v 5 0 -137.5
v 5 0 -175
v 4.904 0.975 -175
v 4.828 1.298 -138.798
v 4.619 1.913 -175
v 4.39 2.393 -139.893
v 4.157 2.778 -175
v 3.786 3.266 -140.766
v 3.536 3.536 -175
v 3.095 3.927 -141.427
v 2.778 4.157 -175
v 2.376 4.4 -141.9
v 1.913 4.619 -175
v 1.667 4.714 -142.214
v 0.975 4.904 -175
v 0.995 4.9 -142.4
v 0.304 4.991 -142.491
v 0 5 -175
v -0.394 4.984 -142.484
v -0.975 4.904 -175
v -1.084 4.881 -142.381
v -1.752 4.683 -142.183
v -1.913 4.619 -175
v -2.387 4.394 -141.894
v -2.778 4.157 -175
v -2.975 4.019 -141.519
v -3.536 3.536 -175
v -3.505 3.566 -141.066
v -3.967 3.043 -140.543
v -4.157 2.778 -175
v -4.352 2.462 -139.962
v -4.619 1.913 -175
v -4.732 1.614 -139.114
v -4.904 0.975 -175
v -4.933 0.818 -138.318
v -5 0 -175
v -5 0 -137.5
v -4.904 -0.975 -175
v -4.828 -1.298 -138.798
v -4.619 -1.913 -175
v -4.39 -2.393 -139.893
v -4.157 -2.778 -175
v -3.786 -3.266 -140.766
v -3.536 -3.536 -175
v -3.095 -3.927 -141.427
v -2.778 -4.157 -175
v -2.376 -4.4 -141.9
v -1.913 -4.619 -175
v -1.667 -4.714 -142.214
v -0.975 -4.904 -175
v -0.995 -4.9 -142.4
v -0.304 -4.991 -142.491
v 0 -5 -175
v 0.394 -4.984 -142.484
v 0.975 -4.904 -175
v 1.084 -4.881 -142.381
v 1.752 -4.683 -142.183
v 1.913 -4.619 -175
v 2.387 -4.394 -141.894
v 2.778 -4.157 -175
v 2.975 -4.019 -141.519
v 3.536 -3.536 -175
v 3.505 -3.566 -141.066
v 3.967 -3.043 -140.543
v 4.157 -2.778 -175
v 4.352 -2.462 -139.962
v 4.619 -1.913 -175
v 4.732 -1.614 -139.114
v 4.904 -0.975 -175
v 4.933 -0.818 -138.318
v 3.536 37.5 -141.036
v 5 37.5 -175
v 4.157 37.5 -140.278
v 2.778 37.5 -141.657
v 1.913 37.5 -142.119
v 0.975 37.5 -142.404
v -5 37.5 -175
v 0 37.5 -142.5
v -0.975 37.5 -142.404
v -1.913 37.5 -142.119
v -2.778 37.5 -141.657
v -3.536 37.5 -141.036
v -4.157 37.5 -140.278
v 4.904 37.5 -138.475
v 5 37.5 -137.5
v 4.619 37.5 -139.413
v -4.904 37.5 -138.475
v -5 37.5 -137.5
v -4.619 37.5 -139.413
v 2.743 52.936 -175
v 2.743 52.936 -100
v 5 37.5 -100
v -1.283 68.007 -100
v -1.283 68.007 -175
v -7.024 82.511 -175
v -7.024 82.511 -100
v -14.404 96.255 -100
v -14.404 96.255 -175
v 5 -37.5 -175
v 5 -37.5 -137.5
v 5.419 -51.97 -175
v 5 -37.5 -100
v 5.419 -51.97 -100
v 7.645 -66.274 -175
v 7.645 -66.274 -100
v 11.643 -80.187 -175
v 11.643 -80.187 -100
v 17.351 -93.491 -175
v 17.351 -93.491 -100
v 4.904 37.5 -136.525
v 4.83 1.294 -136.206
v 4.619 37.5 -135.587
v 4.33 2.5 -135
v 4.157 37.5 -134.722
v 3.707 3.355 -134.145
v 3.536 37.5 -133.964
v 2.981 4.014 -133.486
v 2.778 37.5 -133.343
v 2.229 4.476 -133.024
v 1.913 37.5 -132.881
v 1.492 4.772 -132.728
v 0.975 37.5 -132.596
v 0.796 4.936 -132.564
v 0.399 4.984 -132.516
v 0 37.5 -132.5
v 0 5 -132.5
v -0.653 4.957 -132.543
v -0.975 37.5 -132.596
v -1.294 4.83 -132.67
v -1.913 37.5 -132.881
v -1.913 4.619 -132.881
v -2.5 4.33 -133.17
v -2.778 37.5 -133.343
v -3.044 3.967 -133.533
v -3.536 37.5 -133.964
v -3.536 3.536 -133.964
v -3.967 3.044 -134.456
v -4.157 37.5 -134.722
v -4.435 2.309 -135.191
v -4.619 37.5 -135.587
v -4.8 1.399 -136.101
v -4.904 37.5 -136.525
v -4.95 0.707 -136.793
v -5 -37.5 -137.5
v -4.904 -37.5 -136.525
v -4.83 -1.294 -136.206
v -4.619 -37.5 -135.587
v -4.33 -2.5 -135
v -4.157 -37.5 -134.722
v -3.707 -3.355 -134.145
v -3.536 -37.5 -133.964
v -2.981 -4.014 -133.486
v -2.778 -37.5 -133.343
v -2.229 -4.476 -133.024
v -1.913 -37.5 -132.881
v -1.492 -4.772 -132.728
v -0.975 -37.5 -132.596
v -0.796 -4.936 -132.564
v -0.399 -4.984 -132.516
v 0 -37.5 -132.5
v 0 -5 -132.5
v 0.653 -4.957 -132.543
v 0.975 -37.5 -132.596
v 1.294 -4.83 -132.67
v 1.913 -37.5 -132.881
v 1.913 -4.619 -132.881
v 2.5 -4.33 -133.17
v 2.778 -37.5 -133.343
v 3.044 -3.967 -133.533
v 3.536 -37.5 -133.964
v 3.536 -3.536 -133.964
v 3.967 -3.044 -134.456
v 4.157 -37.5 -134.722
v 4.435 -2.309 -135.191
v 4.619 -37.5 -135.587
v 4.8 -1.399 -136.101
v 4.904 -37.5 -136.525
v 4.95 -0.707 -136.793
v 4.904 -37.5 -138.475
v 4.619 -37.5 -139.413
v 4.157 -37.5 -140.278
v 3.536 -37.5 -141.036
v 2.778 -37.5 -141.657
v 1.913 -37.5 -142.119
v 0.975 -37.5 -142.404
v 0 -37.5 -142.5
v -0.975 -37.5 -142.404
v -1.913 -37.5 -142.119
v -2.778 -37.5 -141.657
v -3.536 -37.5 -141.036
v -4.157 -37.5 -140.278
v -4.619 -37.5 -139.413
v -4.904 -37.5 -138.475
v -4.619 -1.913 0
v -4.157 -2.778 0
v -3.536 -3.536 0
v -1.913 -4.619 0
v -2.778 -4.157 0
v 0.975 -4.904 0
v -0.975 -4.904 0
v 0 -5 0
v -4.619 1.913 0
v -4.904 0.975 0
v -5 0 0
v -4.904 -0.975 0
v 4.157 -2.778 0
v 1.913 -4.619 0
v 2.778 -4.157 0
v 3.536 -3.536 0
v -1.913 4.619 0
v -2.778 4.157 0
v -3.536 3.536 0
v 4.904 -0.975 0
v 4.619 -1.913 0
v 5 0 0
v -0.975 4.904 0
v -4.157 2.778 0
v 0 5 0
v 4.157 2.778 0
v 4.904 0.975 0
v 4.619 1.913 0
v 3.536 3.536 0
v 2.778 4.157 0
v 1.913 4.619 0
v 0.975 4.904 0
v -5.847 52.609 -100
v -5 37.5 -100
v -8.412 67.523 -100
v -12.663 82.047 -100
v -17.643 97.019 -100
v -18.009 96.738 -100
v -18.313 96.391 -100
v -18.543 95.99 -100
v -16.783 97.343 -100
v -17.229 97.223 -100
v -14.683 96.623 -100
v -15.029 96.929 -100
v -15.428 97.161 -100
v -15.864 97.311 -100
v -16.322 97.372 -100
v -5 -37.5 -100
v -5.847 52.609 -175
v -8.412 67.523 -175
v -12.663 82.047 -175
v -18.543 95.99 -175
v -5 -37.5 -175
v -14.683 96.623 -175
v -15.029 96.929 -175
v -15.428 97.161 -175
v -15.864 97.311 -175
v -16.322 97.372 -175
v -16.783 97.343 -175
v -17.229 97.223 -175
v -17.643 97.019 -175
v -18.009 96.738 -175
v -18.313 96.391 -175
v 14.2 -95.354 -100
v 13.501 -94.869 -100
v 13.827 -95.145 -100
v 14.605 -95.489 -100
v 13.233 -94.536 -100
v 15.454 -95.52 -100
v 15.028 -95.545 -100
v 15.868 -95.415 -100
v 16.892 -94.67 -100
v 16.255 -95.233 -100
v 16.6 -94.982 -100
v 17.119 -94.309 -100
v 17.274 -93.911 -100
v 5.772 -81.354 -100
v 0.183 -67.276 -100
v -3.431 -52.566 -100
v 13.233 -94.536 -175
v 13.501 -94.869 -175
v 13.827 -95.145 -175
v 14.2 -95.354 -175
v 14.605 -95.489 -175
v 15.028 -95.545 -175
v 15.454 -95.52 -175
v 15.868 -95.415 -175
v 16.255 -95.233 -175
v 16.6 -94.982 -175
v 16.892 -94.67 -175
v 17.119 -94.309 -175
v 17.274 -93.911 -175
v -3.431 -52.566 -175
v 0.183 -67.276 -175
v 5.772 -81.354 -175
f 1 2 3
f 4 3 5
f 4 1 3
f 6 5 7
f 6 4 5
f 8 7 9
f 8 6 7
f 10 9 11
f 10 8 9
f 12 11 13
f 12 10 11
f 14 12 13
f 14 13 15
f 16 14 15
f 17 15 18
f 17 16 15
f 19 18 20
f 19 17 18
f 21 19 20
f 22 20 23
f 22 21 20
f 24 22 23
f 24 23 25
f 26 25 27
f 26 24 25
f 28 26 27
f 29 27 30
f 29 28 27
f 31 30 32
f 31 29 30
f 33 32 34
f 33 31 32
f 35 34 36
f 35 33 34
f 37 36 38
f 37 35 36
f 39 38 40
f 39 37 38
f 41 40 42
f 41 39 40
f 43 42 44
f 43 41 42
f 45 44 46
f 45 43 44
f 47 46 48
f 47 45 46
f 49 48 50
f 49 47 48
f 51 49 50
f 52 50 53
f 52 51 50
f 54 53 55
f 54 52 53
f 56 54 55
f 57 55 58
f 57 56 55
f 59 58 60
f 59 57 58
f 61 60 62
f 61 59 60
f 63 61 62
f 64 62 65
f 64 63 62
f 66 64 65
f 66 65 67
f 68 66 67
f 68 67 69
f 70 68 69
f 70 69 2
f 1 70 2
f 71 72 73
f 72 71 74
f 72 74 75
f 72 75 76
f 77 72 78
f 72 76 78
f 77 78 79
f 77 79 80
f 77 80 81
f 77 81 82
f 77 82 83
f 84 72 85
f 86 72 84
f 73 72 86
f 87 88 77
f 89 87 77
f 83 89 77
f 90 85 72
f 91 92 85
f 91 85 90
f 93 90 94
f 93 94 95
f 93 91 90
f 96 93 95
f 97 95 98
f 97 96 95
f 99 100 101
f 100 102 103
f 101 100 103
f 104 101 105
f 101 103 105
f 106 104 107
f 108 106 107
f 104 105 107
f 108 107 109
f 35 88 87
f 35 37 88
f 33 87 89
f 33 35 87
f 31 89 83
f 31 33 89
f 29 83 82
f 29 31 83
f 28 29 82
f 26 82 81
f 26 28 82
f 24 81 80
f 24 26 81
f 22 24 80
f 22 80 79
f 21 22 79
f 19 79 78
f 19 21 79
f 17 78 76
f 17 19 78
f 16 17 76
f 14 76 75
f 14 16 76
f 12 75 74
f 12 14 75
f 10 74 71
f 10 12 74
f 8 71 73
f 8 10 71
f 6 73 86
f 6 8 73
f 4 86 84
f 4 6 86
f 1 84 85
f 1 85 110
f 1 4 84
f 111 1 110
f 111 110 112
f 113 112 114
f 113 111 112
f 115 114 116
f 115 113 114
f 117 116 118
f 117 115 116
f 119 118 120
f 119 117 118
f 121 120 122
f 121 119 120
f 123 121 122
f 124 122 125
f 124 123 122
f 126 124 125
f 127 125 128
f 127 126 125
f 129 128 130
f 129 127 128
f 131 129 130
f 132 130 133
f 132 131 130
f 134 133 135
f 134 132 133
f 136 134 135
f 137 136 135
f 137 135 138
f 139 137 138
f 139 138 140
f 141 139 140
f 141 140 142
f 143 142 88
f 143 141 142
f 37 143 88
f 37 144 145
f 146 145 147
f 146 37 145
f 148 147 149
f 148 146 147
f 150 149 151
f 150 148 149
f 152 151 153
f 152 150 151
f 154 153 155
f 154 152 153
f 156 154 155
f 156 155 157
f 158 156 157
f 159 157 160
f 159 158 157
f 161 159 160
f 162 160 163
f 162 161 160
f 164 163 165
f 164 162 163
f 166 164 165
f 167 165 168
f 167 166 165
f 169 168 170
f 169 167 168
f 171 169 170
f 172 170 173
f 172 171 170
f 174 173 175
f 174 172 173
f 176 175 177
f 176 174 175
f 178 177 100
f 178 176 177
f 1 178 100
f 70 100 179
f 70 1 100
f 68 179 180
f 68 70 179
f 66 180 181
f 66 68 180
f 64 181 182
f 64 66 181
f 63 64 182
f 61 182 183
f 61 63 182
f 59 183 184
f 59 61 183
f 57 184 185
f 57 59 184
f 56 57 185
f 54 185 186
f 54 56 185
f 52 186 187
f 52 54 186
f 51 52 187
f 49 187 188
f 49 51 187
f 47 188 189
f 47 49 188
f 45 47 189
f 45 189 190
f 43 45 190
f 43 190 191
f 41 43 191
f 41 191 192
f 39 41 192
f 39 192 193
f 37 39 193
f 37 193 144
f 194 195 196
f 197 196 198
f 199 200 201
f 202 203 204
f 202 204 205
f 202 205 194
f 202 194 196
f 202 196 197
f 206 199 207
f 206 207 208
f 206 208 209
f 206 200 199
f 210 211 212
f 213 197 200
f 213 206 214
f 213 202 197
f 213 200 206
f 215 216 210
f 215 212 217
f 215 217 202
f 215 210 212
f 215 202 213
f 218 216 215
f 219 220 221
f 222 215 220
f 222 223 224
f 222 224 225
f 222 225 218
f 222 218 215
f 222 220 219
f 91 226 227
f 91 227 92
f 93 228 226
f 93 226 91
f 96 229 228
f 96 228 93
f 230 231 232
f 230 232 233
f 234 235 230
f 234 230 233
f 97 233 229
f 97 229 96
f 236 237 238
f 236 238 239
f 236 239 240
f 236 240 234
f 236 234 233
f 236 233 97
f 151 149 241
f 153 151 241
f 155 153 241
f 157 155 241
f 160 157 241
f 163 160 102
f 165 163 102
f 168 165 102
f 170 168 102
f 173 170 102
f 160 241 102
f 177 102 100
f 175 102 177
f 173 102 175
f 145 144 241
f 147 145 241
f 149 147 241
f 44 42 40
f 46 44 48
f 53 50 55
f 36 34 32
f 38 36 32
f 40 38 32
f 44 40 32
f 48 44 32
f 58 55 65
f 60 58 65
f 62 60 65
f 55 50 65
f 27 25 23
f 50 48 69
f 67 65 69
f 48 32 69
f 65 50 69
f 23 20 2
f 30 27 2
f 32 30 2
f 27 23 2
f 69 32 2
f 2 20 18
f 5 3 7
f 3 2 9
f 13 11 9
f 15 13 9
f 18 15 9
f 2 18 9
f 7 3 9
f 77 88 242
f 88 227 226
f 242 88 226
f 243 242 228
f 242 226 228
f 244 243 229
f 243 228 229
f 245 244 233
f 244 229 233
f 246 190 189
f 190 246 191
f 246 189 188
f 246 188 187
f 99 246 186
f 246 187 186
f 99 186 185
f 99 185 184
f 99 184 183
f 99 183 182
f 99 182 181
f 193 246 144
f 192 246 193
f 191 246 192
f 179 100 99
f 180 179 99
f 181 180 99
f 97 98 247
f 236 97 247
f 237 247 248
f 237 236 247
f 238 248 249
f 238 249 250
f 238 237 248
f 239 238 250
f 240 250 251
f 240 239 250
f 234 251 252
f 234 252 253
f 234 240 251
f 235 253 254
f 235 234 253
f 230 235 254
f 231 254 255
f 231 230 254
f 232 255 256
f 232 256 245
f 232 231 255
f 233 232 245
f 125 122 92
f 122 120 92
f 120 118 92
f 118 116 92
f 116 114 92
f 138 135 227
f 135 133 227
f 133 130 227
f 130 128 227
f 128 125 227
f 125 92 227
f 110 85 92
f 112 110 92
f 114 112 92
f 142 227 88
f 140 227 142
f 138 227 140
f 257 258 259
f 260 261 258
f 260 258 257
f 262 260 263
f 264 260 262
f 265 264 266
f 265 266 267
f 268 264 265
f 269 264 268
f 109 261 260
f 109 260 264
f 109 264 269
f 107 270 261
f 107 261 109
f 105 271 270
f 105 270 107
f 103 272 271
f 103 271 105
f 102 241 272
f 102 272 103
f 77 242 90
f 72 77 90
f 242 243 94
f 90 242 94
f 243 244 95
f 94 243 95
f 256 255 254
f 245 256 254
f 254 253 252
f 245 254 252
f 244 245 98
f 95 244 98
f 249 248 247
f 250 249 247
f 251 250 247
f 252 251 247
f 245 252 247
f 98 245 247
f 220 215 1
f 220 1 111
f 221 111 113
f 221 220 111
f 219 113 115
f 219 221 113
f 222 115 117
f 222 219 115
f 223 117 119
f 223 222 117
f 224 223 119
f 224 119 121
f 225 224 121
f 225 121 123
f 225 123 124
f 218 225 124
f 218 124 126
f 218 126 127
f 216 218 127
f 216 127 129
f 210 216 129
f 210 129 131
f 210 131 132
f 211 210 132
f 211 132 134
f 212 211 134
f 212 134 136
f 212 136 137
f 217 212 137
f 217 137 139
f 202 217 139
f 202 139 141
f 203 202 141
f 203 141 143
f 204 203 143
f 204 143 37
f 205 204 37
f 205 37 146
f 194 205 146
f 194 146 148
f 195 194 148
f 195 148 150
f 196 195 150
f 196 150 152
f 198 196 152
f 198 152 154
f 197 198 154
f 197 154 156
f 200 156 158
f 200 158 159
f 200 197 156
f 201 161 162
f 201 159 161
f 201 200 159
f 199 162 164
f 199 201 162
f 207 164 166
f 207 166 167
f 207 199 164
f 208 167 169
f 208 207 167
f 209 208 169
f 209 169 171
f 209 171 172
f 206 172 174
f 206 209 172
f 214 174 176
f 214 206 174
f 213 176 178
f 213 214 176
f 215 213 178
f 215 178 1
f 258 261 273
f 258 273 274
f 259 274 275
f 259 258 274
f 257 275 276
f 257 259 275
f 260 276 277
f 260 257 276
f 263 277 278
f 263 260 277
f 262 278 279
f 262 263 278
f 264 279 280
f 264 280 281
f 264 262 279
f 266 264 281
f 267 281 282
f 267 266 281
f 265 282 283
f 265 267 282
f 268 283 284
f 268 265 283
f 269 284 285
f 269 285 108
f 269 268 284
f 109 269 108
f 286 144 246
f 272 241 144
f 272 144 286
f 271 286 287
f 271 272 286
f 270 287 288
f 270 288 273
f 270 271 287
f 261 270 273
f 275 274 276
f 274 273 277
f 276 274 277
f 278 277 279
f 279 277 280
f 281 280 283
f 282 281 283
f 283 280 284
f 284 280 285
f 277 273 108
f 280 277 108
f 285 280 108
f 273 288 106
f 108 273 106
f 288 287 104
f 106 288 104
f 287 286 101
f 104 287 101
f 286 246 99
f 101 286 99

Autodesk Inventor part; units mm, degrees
ref_plane "YZ Plane" through (0, 0, 0) normal (1, 0, 0) x (0, 1, 0)
ref_plane "XZ Plane" through (0, 0, 0) normal (0, 1, 0) x (-1, 0, 0)
ref_plane "XY Plane" through (0, 0, 0) normal (0, 0, 1) x (1, 0, 0)
sketch "Sketch1" plane through (0, 0, 0) normal (0, 0, 1) x (1, 0, 0)
  circle A0 centre (0, 0) radius 5
  dimension "d0" = 10
extrude "Extrusion1" add sketch "Sketch1" against normal blind 175
ref_plane "Work Plane1" through (0, 0, -100) normal (0, 0, 1) x (1, 0, 0)
sketch "Sketch2" plane through (0, 0, 0) normal (0, 1, 0) x (-1, 0, 0)
  circle A0 centre (0, -137.5) radius 5
  line L0 (-5, -175) -> (5, -175) projected
  point P0 (0, 0)
  dimension "d4" = 10
  dimension "d5" = 37.5
extrude "Extrusion2" add sketch "Sketch2" along normal mid plane 75
sketch "Sketch5" plane through (0, 0, -100) normal (0, 0, 1) x (1, 0, 0)
  line L0 (5, 37.5) -> (-5, 37.5) projected
  arc A0 (-5, 37.5) -> (-18.5426, 95.9905) centre (-137.4066, 37.6564) ccw
  arc A1 (5, 37.5) -> (-14.4042, 96.255) centre (-129.1845, 25.7664) ccw
  arc A2 (-14.4042, 96.255) -> (-18.5426, 95.9905) centre (-16.4034, 95.0273) ccw
  line L1 (-5, -37.5) -> (5, -37.5) projected
  arc A3 (5, -37.5) -> (17.351, -93.4908) centre (120.393, -41.4031) ccw
  arc A4 (-5, -37.5) -> (13.2332, -94.5364) centre (105.5133, -33.604) ccw
  line L2 (5, -37.5) -> (-5, -37.5)
  line L3 (5, 37.5) -> (-5, 37.5)
  arc A5 (13.2332, -94.5364) -> (17.351, -93.4908) centre (15.1102, -93.297) ccw
  point P0 (0, 0)
extrude "Extrusion4" add sketch "Sketch5" against normal blind 75
properties part number "wet_proj_aandrijstang_2"
